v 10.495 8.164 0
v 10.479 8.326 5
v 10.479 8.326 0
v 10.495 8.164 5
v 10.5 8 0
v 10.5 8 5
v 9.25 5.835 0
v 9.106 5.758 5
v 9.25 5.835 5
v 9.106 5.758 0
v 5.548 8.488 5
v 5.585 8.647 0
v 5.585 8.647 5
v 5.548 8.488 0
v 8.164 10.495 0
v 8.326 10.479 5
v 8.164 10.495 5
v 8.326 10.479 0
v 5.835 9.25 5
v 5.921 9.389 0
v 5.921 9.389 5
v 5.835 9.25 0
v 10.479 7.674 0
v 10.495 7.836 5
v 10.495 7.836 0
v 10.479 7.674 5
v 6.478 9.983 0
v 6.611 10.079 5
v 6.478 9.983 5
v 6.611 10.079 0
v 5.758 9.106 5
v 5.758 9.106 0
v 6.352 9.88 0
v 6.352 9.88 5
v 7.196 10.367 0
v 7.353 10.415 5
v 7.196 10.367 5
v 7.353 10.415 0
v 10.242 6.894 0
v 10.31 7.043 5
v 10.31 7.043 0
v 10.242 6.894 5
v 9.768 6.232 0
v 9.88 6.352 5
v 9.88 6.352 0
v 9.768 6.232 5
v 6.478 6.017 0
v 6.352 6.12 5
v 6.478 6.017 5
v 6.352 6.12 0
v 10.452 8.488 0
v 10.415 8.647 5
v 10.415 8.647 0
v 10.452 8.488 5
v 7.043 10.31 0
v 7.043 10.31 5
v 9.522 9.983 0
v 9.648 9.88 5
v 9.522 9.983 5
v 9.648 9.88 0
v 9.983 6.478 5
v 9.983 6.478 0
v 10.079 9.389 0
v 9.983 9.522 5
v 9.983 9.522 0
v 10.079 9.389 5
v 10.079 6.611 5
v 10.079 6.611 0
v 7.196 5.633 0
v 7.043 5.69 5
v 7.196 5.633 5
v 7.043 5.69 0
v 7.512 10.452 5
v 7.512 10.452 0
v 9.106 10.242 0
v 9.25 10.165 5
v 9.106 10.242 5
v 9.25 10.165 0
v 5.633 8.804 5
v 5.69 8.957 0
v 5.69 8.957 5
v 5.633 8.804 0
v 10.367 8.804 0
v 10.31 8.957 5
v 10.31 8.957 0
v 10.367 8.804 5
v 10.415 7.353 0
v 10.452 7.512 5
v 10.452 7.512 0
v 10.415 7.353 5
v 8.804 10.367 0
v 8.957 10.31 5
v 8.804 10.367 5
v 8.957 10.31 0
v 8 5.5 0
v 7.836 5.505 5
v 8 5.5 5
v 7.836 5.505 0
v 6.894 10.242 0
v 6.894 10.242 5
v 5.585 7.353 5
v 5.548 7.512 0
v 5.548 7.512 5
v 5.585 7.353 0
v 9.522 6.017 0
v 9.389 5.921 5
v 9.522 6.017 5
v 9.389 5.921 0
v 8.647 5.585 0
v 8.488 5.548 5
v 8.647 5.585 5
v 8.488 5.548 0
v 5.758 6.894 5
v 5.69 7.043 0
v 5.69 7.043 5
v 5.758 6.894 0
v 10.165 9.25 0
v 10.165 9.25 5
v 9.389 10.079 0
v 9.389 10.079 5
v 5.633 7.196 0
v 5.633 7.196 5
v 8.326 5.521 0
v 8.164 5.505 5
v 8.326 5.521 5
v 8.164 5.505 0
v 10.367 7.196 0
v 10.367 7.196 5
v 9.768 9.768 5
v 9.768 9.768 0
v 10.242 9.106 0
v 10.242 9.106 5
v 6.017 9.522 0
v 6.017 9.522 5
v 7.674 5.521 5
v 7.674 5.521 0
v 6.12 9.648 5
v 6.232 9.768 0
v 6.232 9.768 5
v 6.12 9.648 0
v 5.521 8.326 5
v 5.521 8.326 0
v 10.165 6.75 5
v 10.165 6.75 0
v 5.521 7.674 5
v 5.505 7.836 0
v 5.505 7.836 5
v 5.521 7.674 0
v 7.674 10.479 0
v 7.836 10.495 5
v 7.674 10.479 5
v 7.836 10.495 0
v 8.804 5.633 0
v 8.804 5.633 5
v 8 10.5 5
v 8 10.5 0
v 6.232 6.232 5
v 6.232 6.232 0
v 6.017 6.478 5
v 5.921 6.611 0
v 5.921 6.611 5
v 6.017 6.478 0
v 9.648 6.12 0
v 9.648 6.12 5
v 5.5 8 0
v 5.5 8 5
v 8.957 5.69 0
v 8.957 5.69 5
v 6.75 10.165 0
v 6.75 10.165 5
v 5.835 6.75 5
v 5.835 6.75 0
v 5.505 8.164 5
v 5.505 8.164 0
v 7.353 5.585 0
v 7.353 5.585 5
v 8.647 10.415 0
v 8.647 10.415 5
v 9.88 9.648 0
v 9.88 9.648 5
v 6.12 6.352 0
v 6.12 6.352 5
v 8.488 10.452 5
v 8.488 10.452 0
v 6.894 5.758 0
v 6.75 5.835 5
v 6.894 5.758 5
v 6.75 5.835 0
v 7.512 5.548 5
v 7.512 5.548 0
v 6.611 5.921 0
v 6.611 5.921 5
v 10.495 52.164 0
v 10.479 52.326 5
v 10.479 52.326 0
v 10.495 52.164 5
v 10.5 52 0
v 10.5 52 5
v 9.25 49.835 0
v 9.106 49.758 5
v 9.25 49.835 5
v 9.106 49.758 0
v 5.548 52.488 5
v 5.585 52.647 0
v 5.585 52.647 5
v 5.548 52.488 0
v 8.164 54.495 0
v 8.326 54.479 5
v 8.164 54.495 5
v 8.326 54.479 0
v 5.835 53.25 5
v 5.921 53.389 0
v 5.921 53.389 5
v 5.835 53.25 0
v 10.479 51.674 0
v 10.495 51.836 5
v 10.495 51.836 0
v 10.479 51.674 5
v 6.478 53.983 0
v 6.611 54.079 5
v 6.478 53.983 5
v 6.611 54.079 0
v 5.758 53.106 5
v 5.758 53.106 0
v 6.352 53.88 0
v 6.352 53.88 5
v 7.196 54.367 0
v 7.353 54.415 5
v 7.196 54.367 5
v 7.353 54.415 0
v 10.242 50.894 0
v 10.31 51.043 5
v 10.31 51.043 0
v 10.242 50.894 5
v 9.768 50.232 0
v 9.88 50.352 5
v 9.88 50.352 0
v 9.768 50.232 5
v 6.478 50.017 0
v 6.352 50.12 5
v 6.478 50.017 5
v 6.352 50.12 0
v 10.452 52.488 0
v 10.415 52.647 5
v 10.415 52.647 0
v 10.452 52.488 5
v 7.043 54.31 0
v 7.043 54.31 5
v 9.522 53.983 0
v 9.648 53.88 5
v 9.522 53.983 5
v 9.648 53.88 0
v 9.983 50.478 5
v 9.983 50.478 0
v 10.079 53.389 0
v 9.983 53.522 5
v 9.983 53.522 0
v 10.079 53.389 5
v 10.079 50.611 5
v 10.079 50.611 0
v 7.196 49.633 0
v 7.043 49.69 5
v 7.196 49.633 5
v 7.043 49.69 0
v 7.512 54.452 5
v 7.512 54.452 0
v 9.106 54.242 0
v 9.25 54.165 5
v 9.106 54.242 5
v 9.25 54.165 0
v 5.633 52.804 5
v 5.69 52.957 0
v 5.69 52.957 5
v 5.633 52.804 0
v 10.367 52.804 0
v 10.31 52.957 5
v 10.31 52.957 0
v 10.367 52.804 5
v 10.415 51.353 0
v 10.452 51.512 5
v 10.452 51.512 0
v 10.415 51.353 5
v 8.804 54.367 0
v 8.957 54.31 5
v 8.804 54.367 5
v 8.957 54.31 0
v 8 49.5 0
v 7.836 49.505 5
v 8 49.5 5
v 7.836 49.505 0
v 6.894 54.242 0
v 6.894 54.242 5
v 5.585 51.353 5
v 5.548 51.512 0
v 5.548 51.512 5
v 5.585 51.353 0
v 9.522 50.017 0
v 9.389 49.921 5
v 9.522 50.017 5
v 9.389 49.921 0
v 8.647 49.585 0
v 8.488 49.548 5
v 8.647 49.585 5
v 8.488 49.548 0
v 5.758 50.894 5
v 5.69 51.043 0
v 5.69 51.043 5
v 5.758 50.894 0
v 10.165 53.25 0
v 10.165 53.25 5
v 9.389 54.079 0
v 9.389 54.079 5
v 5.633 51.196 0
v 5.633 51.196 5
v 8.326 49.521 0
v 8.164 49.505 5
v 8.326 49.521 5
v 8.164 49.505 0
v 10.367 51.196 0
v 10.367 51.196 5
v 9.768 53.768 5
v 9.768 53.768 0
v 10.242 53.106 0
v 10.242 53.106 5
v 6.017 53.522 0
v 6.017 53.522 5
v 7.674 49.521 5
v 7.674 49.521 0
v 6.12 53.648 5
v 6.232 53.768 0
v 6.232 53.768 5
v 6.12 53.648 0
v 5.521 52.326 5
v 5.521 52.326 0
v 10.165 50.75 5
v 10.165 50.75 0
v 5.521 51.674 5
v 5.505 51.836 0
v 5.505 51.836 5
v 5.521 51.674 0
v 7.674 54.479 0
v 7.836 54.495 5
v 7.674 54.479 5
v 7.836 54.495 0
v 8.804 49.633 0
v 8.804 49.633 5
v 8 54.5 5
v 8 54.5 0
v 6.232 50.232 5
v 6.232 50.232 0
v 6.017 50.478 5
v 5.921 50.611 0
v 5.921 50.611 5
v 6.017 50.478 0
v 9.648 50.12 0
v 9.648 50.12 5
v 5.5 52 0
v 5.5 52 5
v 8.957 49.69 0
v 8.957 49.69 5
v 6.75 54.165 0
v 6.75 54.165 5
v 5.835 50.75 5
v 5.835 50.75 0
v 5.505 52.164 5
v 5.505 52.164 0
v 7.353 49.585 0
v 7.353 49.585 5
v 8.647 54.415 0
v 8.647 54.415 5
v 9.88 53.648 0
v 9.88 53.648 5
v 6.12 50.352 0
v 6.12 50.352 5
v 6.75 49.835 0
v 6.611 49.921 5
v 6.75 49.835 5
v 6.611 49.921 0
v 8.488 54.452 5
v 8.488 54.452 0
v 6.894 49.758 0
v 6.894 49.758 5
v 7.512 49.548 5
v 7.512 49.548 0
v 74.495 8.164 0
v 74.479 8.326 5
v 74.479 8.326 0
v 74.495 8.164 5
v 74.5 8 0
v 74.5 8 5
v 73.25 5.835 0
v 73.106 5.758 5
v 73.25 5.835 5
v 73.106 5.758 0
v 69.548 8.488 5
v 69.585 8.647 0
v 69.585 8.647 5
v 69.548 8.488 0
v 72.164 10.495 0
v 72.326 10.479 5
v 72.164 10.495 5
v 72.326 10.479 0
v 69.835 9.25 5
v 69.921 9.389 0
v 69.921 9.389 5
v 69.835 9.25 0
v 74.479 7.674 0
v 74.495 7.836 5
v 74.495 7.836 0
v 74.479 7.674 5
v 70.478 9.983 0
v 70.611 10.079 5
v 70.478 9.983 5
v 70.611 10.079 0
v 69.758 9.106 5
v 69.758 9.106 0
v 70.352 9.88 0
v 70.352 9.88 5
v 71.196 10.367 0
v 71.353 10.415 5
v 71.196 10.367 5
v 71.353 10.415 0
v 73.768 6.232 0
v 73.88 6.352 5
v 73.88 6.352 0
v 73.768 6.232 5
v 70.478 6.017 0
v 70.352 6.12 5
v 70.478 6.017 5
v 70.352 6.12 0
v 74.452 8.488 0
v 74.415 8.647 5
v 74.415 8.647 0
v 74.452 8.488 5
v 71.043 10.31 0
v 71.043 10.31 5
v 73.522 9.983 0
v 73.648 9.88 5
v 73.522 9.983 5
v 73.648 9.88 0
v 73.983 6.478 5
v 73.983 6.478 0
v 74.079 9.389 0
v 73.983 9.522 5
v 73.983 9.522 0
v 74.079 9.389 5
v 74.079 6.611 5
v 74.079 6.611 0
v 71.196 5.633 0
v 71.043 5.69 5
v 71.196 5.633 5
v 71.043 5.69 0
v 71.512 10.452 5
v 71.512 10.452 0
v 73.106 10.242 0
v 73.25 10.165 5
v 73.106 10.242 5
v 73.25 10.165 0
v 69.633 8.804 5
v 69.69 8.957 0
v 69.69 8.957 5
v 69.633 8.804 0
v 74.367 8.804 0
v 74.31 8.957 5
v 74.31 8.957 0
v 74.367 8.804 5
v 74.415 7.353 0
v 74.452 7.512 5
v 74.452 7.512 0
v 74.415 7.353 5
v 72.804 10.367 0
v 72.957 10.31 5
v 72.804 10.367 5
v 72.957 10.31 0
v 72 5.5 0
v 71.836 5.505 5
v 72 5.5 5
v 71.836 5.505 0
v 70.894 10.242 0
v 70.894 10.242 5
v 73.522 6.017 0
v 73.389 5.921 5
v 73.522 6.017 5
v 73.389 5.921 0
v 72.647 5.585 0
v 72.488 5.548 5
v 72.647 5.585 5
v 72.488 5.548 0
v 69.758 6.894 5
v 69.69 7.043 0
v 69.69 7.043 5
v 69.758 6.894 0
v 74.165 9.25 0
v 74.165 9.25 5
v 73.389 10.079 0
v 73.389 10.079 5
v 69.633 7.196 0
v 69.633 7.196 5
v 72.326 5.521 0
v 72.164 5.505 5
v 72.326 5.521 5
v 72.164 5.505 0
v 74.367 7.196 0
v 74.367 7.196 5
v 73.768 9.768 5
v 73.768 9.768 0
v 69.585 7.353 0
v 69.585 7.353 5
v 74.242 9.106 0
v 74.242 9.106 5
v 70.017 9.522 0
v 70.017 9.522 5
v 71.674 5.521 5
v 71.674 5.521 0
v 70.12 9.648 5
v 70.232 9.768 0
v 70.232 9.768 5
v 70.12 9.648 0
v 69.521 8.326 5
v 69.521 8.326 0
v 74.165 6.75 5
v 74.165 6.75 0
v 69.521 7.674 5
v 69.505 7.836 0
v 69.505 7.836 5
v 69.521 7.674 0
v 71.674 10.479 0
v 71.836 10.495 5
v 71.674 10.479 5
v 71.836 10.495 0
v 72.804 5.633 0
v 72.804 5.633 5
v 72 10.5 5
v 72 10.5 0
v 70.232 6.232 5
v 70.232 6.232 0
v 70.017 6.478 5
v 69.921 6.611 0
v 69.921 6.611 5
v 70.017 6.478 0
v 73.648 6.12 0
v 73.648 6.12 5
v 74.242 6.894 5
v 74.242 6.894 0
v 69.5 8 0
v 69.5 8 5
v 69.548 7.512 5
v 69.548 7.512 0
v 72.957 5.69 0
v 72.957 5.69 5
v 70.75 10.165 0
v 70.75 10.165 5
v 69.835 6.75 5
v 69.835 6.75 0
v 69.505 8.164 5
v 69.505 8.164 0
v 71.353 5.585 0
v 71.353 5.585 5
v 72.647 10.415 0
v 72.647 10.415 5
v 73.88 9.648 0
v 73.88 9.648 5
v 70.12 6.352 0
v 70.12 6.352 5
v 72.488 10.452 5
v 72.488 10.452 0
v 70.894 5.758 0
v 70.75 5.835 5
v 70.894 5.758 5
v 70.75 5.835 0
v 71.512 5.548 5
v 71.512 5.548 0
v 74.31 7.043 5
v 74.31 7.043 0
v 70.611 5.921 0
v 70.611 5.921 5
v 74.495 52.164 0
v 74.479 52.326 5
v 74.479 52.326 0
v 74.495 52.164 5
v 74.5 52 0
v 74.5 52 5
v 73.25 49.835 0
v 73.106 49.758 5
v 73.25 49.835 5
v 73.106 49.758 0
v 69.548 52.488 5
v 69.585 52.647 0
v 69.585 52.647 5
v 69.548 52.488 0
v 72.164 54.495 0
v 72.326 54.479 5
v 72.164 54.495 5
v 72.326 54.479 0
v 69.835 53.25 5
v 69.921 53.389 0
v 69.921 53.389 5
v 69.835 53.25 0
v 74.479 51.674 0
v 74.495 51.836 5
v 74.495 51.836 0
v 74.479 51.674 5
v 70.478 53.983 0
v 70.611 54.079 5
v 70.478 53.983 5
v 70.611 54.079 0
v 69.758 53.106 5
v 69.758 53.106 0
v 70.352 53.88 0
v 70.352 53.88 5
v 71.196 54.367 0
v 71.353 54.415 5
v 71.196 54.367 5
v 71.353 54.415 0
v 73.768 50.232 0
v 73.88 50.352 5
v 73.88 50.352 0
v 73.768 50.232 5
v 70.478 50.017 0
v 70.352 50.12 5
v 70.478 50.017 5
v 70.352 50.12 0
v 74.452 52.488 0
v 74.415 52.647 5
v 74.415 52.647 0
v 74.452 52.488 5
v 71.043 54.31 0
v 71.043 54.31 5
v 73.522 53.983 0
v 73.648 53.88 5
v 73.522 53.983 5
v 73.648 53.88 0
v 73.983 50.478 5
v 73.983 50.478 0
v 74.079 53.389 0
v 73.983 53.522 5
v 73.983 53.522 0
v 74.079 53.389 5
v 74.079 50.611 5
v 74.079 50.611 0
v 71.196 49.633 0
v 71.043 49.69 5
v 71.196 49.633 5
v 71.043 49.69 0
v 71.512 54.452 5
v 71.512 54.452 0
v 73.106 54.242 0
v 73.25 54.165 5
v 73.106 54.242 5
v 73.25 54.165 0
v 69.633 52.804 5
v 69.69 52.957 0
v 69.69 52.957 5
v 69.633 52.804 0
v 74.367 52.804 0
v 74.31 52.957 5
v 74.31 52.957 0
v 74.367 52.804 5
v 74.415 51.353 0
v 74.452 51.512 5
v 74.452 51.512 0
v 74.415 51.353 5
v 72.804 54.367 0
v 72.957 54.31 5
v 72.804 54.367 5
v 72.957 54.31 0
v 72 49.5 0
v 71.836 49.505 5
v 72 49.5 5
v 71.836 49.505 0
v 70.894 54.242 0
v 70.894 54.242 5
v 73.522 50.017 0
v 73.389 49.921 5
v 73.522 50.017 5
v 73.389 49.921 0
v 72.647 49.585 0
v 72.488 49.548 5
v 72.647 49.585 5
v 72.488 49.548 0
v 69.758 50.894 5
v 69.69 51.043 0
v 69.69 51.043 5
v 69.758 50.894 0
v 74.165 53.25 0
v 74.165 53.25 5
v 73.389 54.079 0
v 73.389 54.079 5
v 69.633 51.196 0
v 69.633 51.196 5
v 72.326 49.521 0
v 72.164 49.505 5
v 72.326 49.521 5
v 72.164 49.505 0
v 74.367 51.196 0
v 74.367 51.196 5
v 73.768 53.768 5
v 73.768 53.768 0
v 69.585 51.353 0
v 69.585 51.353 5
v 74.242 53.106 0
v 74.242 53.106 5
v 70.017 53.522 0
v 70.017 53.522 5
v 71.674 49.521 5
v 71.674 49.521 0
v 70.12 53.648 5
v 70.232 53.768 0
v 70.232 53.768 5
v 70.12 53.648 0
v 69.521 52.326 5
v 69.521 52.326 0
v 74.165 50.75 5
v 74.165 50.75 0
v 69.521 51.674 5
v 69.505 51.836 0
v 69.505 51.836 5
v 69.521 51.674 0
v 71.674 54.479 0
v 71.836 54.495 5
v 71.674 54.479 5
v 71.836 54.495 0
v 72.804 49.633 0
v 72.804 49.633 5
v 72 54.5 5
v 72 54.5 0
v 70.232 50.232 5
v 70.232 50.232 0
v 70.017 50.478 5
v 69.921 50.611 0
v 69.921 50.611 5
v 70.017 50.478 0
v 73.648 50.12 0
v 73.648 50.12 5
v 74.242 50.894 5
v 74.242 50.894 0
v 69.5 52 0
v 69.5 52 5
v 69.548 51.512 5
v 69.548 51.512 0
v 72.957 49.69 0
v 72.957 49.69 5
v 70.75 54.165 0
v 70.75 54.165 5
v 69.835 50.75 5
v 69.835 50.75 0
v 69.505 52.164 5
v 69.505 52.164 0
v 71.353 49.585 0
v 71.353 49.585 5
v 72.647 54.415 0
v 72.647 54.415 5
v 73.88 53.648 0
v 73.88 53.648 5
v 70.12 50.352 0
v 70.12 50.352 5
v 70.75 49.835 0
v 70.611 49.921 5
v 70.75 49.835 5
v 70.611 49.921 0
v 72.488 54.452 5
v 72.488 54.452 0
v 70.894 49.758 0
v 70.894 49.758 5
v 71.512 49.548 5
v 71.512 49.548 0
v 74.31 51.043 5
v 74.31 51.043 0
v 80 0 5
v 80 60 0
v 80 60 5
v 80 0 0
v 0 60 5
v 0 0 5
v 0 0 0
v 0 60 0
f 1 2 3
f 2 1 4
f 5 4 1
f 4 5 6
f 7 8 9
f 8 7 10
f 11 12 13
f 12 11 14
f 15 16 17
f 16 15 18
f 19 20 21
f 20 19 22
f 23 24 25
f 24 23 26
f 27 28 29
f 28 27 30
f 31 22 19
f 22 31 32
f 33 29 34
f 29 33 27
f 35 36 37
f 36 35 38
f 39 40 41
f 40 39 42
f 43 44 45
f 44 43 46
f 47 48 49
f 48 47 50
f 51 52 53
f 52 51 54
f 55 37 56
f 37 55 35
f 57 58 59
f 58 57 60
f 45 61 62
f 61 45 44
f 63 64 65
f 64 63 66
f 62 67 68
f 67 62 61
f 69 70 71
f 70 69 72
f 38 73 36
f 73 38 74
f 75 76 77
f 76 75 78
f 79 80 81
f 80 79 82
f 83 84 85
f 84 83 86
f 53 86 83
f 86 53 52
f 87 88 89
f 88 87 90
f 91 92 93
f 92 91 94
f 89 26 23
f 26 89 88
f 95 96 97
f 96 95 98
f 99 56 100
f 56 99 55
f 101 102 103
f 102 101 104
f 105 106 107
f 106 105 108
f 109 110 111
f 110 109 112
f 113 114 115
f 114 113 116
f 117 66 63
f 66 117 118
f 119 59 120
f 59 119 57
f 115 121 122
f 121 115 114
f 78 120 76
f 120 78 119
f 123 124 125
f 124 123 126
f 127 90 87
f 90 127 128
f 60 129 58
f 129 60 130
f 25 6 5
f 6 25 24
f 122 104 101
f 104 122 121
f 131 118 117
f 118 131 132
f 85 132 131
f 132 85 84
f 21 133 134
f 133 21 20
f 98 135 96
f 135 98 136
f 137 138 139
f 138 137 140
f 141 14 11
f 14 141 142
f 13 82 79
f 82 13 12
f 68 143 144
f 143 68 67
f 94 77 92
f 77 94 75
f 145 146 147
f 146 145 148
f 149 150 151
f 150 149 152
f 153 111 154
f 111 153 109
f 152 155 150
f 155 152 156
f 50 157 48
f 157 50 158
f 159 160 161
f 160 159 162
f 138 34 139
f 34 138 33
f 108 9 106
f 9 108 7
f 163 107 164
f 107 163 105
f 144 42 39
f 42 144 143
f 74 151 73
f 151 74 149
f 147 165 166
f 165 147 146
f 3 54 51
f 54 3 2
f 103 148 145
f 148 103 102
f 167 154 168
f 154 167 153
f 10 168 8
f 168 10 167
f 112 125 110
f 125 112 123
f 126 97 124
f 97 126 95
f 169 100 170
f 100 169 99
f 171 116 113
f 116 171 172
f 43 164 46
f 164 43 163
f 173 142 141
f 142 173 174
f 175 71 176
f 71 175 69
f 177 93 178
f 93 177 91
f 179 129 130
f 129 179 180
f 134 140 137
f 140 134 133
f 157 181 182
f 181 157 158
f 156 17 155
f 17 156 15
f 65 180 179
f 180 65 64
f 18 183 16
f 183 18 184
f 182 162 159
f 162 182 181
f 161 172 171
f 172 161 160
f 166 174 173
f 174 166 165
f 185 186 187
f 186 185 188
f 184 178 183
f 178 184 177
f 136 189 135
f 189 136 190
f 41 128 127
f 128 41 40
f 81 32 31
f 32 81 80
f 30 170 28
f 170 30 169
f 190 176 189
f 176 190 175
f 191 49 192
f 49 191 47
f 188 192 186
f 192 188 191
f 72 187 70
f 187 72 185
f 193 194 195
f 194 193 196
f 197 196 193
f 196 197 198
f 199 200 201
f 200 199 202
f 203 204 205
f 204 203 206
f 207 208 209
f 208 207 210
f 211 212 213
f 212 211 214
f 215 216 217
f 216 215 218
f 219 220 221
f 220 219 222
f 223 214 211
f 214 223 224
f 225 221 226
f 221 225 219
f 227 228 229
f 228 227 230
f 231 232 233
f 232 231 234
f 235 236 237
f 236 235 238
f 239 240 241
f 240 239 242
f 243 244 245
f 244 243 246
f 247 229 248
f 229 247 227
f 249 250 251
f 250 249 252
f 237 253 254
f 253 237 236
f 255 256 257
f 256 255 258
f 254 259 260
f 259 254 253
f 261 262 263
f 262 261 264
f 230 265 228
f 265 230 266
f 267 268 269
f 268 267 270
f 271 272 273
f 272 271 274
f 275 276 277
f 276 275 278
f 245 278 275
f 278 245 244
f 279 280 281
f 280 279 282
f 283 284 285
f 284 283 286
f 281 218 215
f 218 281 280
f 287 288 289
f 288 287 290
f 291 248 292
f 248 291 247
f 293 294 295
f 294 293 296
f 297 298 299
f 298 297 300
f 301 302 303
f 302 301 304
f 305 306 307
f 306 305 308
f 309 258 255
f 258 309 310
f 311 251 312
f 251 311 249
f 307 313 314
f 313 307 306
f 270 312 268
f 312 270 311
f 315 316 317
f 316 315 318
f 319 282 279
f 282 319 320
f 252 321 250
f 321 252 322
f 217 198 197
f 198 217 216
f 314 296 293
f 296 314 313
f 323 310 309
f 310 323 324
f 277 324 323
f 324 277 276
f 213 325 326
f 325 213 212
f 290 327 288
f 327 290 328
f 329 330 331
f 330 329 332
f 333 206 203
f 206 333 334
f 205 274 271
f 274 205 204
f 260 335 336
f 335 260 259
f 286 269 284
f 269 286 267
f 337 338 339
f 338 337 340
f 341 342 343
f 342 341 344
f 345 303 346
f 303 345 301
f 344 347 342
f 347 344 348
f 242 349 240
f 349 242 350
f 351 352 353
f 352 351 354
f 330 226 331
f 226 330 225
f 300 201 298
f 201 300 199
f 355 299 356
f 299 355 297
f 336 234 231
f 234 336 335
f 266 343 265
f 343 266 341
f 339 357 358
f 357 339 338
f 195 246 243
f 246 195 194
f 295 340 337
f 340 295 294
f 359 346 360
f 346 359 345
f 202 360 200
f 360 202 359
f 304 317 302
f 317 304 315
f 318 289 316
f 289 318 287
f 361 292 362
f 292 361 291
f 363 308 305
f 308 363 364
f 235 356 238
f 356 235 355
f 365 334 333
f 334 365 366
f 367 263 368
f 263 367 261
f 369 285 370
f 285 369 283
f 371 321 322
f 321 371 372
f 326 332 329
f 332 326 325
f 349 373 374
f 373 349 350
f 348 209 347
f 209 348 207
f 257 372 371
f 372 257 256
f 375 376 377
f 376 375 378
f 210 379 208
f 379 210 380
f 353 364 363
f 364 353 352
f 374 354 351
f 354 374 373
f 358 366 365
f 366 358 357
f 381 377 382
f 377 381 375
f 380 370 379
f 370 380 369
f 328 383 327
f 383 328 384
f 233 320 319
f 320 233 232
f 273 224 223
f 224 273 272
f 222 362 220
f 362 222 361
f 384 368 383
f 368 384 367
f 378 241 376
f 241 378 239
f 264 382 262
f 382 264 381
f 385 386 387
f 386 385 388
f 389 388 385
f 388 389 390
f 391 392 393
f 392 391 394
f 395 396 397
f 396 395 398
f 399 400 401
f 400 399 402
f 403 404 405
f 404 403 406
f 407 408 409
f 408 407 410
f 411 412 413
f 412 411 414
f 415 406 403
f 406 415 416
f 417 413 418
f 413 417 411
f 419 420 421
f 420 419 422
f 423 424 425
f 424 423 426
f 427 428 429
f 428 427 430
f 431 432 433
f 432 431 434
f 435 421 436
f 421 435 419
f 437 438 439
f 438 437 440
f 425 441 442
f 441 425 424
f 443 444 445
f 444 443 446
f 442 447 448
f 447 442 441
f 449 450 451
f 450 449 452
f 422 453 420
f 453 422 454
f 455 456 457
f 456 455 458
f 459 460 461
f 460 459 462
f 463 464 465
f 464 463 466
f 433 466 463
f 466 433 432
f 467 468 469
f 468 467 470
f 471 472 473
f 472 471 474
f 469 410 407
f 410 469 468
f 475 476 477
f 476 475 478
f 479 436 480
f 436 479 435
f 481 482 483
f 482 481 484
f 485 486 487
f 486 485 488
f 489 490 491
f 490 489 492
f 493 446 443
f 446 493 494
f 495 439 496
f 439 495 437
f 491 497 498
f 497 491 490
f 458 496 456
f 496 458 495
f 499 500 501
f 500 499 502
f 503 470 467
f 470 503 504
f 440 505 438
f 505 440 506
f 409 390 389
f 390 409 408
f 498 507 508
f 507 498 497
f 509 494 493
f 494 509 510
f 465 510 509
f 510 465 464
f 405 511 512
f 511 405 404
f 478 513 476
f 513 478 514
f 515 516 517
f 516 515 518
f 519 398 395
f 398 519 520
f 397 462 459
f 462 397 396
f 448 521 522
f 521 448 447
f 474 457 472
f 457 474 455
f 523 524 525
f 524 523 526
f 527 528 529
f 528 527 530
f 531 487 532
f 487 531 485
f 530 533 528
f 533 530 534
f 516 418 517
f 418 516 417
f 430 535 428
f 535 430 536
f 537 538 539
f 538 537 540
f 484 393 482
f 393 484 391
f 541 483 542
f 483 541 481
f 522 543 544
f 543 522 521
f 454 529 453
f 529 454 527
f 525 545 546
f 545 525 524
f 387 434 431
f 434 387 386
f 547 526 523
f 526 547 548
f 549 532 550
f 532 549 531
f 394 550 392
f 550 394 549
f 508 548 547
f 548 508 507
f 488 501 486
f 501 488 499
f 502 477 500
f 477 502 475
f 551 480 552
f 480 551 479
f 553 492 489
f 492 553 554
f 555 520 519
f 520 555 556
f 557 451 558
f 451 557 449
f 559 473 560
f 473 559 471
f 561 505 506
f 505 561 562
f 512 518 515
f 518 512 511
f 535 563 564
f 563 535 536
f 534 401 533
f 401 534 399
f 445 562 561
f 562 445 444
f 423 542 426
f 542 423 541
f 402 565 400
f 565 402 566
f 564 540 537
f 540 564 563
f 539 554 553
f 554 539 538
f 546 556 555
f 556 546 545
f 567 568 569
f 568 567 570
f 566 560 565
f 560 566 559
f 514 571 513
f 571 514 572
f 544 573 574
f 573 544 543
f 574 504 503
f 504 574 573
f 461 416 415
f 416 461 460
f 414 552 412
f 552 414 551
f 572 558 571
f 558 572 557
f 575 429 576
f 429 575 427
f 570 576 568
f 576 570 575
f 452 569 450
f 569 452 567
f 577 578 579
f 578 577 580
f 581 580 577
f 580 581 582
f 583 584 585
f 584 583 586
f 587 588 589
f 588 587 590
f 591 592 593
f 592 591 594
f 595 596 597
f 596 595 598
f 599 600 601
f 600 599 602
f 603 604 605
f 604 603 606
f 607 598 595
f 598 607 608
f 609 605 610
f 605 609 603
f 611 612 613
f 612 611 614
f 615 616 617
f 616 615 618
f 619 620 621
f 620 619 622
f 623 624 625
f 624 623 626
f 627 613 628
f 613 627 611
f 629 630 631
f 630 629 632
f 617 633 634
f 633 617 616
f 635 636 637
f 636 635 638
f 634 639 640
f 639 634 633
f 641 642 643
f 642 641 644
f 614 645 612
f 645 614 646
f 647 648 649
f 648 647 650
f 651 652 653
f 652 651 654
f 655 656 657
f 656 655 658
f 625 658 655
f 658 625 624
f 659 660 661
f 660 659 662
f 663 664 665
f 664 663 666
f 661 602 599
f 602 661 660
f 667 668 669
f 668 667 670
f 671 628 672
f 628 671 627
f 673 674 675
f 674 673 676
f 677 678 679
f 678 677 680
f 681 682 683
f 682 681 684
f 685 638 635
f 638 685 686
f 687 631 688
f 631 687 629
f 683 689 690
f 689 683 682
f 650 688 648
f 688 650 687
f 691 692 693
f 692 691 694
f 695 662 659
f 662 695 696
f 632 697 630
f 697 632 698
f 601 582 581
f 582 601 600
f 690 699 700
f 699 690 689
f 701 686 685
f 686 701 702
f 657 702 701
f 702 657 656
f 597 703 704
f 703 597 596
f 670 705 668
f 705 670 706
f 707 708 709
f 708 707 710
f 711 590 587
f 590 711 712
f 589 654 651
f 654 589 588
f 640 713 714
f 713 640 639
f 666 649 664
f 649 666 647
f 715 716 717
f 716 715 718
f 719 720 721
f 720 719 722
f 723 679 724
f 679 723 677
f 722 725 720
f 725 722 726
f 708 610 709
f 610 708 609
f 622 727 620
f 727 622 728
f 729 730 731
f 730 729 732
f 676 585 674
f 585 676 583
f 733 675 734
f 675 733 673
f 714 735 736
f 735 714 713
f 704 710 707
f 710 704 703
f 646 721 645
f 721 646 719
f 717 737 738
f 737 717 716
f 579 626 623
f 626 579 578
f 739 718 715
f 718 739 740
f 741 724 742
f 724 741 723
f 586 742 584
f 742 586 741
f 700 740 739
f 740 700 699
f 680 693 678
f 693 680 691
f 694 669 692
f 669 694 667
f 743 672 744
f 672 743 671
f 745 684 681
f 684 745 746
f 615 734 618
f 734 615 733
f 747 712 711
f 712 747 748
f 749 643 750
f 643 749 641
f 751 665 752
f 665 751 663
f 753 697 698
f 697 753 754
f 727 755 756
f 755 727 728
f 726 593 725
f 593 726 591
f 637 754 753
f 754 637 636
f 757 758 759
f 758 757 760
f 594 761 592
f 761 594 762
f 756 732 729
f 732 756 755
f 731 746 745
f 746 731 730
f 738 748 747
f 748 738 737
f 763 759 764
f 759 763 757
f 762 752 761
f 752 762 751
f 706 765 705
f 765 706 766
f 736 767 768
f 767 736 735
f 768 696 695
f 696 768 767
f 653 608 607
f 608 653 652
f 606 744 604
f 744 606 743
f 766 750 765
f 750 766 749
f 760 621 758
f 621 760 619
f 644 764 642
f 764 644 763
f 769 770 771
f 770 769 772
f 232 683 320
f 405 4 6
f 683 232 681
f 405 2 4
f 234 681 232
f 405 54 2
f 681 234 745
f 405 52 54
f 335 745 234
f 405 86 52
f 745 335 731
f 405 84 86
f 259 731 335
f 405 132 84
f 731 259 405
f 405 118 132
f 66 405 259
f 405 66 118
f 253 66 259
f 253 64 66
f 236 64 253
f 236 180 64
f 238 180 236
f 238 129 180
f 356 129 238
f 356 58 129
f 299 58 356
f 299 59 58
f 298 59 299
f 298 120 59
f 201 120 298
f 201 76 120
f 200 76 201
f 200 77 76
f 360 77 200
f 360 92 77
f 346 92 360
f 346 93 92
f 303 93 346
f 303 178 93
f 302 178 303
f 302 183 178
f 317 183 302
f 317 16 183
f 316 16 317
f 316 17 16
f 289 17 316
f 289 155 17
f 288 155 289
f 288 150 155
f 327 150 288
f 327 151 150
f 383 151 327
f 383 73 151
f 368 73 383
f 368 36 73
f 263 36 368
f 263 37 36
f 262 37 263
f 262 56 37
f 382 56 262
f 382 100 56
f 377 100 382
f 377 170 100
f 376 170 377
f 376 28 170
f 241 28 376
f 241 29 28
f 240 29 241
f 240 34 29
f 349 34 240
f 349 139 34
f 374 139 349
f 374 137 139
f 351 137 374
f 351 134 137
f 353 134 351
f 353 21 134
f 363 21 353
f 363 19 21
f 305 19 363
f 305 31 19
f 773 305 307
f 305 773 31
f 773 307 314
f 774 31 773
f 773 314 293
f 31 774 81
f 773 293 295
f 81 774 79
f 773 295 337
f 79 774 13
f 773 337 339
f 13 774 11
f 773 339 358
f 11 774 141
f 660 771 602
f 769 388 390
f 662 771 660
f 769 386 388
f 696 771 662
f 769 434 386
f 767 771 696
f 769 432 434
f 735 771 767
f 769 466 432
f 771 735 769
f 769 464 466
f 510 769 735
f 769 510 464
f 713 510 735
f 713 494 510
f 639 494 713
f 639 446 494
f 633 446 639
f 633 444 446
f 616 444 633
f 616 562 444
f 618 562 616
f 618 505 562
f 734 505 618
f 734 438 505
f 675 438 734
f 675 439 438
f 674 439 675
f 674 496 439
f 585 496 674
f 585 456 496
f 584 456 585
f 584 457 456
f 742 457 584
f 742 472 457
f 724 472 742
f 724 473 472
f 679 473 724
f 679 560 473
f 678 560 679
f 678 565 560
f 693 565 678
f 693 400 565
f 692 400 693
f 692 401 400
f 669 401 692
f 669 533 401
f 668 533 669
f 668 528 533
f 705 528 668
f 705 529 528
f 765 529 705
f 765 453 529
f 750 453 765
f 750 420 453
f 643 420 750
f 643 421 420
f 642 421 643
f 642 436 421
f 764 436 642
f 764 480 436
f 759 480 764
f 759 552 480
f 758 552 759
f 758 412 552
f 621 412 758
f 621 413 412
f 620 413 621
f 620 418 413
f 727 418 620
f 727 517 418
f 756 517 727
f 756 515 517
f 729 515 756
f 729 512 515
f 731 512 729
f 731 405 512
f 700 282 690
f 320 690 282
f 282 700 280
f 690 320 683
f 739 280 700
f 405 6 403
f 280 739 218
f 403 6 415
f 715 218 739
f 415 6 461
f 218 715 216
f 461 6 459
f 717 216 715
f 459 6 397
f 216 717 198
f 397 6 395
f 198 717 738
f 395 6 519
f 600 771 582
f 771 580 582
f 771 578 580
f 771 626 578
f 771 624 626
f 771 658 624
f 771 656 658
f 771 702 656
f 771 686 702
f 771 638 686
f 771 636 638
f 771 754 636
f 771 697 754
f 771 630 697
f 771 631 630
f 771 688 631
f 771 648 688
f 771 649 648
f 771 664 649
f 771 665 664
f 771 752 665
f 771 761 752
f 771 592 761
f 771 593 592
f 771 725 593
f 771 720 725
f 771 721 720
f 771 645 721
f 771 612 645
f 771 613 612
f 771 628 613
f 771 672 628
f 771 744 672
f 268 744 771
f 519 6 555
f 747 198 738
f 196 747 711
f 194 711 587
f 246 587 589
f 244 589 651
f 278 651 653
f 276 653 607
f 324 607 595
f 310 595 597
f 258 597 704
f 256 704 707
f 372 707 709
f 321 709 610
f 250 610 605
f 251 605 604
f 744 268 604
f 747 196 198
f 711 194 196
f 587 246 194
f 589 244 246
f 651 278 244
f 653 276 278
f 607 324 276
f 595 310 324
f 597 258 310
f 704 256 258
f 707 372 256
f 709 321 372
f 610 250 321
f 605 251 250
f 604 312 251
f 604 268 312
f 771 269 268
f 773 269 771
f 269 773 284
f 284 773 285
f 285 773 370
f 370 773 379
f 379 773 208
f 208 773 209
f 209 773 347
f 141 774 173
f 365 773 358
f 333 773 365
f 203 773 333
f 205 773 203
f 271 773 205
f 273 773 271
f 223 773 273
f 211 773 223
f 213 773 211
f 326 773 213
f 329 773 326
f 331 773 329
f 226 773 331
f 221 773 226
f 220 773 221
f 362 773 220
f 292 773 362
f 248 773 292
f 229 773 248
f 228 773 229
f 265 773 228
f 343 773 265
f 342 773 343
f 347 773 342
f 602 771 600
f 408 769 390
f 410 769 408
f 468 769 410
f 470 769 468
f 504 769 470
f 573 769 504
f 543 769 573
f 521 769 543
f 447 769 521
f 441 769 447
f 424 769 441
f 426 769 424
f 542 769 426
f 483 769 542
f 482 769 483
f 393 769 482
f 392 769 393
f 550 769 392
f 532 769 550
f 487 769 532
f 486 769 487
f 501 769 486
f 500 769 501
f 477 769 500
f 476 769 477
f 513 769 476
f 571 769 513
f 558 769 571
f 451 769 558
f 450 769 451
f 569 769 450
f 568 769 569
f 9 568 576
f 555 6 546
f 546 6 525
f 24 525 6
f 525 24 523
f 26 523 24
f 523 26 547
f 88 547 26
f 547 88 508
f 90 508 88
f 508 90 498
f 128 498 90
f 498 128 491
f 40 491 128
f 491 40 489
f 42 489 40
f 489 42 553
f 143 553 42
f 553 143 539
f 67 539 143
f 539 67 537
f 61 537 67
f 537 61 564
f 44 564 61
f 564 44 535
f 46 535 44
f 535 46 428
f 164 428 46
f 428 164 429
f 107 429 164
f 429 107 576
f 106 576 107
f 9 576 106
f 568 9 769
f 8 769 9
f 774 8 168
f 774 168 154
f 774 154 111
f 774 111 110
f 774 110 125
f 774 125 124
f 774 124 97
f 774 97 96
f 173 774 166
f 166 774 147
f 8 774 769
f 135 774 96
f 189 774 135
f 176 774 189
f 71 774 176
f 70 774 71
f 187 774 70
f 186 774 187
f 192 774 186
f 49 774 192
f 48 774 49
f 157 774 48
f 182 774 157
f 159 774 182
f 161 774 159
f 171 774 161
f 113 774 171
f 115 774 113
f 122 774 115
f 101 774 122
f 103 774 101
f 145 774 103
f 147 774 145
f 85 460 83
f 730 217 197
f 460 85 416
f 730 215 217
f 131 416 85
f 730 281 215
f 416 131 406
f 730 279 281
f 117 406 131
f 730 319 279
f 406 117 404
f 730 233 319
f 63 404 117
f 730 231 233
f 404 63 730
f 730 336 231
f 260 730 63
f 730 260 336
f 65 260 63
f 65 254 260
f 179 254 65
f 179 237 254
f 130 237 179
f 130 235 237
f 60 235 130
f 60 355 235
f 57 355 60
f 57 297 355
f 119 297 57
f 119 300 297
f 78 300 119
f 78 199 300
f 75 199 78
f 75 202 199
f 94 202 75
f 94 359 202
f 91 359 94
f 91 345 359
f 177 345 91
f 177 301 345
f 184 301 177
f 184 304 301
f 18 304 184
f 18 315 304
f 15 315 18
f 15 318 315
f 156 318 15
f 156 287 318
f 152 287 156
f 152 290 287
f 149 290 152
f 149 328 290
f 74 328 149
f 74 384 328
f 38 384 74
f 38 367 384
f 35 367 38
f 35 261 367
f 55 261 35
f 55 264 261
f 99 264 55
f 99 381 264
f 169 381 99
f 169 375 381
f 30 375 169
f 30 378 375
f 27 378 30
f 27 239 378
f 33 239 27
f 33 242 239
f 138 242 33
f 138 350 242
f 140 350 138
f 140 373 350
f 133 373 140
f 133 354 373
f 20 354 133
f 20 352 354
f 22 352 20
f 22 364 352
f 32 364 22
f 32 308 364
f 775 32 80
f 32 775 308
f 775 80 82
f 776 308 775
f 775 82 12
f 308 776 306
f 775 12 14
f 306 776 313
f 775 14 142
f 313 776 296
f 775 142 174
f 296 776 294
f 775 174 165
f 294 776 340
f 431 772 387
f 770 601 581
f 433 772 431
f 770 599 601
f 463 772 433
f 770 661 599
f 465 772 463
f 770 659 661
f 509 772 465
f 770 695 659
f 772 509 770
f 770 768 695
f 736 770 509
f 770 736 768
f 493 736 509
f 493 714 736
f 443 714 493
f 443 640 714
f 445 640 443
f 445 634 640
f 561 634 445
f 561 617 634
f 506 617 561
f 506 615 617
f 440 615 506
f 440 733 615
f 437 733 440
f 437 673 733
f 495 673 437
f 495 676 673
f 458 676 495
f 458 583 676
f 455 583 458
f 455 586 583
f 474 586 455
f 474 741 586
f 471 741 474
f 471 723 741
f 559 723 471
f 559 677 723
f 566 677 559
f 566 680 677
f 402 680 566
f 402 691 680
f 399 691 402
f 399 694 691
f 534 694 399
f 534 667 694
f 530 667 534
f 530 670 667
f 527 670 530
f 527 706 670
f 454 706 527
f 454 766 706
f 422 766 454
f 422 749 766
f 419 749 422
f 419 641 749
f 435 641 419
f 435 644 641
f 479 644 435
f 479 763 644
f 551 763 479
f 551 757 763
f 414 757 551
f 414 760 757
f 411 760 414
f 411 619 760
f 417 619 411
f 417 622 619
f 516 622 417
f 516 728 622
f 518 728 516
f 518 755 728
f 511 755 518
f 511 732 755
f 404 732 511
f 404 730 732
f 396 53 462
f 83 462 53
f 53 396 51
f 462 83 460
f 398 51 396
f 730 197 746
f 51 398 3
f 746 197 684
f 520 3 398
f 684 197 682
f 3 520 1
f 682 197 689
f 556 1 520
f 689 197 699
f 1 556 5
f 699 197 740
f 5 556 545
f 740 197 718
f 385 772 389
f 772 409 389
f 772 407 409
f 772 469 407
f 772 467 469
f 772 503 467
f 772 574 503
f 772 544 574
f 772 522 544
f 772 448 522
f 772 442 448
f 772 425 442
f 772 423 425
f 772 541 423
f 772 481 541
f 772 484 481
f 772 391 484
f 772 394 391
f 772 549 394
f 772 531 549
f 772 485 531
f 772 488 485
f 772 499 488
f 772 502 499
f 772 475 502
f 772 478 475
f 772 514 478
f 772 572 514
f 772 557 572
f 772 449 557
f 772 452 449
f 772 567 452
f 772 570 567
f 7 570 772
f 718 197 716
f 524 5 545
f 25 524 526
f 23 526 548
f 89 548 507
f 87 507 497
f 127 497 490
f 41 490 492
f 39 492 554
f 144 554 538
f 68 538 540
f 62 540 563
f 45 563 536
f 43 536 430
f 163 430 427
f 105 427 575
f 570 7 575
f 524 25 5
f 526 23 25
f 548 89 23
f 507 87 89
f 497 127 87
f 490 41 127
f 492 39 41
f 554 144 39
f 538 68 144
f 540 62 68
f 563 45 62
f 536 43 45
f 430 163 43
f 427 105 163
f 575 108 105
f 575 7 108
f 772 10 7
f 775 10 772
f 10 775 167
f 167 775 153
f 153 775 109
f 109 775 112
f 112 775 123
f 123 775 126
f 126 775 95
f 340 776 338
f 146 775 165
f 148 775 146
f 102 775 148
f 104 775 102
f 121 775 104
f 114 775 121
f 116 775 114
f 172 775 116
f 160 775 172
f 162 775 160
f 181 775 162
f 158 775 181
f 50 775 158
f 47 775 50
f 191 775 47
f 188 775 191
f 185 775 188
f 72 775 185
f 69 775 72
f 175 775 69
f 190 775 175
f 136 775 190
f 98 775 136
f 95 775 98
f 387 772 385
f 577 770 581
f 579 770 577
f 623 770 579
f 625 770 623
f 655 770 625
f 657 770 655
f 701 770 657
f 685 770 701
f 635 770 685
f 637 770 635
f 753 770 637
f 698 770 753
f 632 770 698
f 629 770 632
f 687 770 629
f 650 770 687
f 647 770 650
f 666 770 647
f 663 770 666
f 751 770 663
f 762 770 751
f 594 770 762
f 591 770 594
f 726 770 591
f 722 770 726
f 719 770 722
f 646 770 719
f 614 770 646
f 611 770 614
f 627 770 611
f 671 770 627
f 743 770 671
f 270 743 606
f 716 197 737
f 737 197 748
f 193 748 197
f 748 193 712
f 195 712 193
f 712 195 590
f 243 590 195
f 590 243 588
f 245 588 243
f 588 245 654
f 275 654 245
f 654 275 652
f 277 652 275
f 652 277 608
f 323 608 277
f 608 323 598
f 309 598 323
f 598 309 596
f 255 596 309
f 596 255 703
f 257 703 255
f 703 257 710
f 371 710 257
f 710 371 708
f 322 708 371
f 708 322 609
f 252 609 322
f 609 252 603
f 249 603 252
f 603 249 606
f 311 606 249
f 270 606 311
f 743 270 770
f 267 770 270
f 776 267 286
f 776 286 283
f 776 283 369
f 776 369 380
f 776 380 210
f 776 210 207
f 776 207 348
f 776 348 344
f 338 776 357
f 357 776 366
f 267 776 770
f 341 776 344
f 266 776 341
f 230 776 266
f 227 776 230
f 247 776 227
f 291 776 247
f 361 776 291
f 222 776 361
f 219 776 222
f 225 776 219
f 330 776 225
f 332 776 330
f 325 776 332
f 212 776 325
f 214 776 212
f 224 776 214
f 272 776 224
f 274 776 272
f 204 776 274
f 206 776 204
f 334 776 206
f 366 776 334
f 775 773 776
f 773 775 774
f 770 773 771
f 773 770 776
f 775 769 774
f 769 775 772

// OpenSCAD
// 80 x 60 x 5 mm plate with four 5 mm holes centred 8 mm in from both edges at each corner.
difference() {
  cube([80, 60, 5]);
  for (x = [8, 72], y = [8, 52]) translate([x, y, -1]) cylinder(d = 5, h = 7, $fn = 96);
}
